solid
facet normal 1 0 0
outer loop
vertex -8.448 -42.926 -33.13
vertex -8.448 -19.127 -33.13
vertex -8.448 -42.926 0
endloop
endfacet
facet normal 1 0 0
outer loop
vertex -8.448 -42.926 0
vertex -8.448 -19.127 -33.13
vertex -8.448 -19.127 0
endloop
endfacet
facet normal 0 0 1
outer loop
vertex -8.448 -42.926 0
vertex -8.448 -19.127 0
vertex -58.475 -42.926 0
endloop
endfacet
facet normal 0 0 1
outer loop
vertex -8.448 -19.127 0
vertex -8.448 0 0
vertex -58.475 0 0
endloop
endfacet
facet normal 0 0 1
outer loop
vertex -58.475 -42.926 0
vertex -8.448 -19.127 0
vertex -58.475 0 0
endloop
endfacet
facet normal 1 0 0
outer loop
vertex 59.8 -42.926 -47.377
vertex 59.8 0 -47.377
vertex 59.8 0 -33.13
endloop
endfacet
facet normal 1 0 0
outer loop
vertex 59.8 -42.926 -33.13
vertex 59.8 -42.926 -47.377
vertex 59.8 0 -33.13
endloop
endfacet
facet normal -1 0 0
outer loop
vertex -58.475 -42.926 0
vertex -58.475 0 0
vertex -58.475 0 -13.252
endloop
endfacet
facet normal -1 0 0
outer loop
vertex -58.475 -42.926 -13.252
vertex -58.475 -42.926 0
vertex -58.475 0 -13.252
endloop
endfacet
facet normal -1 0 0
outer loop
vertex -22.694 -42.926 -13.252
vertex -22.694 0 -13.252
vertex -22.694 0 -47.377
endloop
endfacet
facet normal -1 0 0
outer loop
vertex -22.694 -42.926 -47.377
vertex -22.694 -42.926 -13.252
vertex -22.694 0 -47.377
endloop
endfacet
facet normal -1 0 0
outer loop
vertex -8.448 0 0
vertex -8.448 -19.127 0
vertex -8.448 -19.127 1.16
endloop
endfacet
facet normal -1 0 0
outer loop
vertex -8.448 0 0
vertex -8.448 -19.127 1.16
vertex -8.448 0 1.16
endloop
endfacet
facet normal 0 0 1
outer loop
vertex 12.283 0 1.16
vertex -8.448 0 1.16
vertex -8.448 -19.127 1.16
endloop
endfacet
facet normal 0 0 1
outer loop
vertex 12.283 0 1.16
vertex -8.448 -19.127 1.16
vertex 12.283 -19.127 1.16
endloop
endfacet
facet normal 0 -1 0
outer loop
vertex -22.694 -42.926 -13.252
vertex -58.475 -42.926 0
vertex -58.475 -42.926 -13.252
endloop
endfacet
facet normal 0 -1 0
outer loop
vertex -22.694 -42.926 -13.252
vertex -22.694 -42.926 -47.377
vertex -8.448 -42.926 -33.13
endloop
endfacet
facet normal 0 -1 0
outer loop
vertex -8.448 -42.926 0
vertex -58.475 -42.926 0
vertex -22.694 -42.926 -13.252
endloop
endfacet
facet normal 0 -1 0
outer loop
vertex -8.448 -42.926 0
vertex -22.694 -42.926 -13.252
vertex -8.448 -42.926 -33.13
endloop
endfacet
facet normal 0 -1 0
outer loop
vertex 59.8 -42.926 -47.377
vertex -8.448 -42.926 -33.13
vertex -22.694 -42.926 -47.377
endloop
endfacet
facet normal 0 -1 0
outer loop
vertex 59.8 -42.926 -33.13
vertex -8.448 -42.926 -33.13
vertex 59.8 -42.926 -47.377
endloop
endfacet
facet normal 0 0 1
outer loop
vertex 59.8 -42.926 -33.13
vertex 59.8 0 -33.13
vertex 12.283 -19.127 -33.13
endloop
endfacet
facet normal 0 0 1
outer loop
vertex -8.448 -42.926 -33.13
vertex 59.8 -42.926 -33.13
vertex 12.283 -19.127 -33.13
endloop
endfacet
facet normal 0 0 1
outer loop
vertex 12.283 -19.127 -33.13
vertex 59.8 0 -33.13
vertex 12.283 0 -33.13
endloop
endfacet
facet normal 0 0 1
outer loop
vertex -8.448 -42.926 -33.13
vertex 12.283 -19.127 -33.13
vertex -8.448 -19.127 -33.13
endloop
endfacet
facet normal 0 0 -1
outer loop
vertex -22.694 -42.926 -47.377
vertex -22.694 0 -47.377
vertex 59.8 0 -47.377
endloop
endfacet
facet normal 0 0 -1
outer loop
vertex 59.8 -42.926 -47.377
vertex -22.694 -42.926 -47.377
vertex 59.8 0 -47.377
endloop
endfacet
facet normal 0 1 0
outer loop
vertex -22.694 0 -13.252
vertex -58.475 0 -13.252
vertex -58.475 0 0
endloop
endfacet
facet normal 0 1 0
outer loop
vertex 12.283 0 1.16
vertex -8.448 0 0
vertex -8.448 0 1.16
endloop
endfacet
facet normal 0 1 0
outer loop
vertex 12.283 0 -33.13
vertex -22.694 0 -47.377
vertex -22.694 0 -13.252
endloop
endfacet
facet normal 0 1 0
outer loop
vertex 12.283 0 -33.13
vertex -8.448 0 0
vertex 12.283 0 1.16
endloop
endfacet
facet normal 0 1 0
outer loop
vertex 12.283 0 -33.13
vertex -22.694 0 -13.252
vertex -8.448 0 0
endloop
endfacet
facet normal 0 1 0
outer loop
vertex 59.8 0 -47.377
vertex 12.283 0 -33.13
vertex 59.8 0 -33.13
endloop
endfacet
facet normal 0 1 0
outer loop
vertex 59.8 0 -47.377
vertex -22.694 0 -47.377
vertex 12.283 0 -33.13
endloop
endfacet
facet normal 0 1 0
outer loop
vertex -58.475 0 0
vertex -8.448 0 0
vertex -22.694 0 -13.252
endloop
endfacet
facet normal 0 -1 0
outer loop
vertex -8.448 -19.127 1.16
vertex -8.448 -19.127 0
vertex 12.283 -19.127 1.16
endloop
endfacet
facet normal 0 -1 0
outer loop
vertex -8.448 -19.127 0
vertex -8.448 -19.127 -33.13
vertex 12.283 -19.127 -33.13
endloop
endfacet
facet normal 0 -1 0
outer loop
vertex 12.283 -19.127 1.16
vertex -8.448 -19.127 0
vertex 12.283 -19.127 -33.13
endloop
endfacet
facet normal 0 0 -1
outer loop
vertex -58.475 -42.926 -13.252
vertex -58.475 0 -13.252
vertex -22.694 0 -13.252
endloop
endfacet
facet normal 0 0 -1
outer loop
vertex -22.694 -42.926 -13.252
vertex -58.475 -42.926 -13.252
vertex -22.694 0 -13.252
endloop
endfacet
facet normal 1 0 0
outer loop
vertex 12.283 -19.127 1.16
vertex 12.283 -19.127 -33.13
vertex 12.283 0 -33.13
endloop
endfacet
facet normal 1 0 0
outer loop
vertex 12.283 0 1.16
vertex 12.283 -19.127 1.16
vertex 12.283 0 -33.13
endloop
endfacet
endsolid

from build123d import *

# Parameters (mm, degrees)
F1_DEPTH = 42.926
F2_W     = 20.731261
F2_H     = 19.1265270114
F3_DEPTH = 34.29


with BuildPart() as f1:
    # F0 (on Front) → F1 (new body)
    with BuildSketch(Plane.XZ):
        Polygon((-22.6943474263, -47.376524657), (59.8004348576, -47.376524657), (59.8004348576, -33.1304371357), (-8.4482617676, -33.1304371357), (-8.4482617676, 0), (-58.4752187133, 0), (-58.4752187133, -13.2521744817), (-22.6943474263, -13.2521744817), align=None)
    extrude(amount=F1_DEPTH)

    # F2 (on face) → F3 (join)
    with BuildSketch(Plane.XY.offset(-33.1304371357)):
        with Locations((1.9173687324, -9.5632635057)):
            Rectangle(F2_W, F2_H)
    extrude(amount=F3_DEPTH)


solid = f1.part
